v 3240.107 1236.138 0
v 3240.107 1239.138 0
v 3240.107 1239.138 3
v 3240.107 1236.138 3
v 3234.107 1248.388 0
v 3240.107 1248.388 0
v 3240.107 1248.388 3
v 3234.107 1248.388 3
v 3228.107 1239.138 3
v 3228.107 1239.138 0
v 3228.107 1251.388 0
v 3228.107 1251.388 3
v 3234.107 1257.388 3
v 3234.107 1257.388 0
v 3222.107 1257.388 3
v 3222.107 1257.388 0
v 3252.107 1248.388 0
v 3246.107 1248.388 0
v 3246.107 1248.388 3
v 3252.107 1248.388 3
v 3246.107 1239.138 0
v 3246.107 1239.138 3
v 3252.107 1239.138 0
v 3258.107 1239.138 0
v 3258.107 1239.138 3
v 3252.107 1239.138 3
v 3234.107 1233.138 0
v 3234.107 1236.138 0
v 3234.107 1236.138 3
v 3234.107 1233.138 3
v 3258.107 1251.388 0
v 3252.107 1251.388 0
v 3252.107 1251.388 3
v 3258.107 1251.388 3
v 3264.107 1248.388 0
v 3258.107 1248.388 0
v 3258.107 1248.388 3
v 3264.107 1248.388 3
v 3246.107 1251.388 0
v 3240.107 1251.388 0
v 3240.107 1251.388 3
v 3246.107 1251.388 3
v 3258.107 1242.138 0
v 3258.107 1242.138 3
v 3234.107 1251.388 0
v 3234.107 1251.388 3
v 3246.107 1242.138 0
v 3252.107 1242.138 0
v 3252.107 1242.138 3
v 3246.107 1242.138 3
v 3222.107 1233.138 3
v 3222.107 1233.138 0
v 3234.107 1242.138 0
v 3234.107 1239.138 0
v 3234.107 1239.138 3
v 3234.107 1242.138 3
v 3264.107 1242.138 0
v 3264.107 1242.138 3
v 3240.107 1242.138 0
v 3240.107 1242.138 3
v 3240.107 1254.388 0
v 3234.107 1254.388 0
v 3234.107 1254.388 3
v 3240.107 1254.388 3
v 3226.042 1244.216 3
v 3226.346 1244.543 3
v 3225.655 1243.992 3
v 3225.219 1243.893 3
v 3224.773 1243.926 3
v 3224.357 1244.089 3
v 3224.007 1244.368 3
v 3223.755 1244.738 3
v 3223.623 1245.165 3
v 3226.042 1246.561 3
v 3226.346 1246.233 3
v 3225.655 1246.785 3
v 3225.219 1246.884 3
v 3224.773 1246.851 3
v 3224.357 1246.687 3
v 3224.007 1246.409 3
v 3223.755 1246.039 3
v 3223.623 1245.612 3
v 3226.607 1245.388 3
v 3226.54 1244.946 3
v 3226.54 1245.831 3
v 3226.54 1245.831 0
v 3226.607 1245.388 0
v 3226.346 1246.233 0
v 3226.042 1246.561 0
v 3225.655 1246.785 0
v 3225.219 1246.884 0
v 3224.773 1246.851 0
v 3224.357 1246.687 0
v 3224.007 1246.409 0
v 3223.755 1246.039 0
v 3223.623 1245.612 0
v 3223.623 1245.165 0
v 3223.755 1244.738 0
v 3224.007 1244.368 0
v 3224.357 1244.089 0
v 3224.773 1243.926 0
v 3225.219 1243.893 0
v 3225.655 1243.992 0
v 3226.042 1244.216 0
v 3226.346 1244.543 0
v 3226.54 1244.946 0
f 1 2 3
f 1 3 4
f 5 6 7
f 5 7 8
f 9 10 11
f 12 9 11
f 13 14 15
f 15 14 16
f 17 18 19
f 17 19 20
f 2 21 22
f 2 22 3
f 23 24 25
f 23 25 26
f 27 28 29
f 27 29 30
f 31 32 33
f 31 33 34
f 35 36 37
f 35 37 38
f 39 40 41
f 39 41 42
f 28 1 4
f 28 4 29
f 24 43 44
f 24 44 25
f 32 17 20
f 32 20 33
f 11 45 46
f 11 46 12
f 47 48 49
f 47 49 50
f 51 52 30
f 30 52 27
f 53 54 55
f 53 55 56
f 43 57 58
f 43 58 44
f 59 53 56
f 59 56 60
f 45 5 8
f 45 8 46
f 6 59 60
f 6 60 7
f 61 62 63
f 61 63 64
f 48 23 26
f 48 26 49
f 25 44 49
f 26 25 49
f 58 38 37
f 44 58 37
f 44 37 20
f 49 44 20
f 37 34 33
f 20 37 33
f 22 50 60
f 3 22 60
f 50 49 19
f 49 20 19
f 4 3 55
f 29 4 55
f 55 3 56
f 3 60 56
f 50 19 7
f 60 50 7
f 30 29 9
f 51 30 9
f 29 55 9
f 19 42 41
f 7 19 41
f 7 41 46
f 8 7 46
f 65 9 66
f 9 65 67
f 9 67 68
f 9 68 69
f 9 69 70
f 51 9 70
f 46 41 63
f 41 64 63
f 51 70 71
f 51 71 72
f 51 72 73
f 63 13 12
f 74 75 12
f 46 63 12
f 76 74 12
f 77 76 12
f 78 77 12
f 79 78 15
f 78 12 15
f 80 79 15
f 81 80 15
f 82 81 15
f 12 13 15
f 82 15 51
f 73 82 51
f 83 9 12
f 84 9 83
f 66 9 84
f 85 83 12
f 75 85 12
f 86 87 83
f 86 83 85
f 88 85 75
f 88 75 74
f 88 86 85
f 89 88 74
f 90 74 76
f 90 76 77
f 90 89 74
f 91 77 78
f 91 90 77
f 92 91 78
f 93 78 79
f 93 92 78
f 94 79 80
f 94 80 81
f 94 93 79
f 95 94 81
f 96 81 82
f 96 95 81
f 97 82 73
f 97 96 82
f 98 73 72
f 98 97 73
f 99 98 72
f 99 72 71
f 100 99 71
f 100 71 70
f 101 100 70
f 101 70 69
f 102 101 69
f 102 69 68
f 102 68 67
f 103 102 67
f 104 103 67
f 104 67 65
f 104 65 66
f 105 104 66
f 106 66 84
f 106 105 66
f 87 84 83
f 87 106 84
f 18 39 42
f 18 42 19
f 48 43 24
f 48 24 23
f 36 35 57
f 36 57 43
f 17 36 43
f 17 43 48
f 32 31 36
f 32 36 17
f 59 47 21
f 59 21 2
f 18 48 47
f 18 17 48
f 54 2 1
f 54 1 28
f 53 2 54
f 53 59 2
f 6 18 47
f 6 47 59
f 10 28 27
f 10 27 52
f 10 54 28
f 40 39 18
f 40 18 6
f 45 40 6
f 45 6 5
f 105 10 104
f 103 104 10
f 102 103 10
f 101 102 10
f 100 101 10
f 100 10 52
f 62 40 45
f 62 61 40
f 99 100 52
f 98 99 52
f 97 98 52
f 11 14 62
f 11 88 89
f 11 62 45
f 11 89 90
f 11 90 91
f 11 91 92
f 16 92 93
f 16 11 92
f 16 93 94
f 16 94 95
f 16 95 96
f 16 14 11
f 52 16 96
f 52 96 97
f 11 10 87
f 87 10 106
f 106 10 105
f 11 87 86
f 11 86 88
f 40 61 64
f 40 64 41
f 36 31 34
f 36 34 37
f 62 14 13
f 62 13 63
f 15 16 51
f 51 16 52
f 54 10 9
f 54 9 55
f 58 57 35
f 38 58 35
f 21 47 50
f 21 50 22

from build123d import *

# Parameters (mm, degrees)
MODEL_R             = 1.5
BOSS_EXTRUDE1_DEPTH = 3


with BuildPart() as part:
    # Model → Boss-Extrude1 (new body)
    with BuildSketch(Plane.XY):
        Polygon((3258.106732125, 1248.388404039), (3264.106732125, 1248.388404039), (3264.106732125, 1245.388404039), (3264.106732125, 1242.138404039), (3258.106732125, 1242.138404039), (3258.106732125, 1239.138404039), (3252.106732125, 1239.138404039), (3252.106732125, 1242.138404039), (3246.106732125, 1242.138404039), (3246.106732125, 1239.138404039), (3240.106732125, 1239.138404039), (3240.106732125, 1236.138404039), (3234.106732125, 1236.138404039), (3234.106732125, 1233.138404039), (3228.106732125, 1233.138404039), (3222.106732125, 1233.138404039), (3222.106732125, 1245.388404039), (3222.106732125, 1257.388404039), (3228.106732125, 1257.388404039), (3234.106732125, 1257.388404039), (3234.106732125, 1254.388404039), (3240.106732125, 1254.388404039), (3240.106732125, 1251.388404039), (3246.106732125, 1251.388404039), (3246.106732125, 1248.388404039), (3252.106732125, 1248.388404039), (3252.106732125, 1251.388404039), (3258.106732125, 1251.388404039), align=None)
        with Locations((3225.106732125, 1245.388404039)):
            Circle(MODEL_R, mode=Mode.SUBTRACT)
        Polygon((3240.106732125, 1248.388404039), (3234.106732125, 1248.388404039), (3234.106732125, 1251.388404039), (3228.106732125, 1251.388404039), (3228.106732125, 1245.388404039), (3228.106732125, 1239.138404039), (3234.106732125, 1239.138404039), (3234.106732125, 1242.138404039), (3240.106732125, 1242.138404039), align=None, mode=Mode.SUBTRACT)
    extrude(amount=BOSS_EXTRUDE1_DEPTH)


solid = part.part
